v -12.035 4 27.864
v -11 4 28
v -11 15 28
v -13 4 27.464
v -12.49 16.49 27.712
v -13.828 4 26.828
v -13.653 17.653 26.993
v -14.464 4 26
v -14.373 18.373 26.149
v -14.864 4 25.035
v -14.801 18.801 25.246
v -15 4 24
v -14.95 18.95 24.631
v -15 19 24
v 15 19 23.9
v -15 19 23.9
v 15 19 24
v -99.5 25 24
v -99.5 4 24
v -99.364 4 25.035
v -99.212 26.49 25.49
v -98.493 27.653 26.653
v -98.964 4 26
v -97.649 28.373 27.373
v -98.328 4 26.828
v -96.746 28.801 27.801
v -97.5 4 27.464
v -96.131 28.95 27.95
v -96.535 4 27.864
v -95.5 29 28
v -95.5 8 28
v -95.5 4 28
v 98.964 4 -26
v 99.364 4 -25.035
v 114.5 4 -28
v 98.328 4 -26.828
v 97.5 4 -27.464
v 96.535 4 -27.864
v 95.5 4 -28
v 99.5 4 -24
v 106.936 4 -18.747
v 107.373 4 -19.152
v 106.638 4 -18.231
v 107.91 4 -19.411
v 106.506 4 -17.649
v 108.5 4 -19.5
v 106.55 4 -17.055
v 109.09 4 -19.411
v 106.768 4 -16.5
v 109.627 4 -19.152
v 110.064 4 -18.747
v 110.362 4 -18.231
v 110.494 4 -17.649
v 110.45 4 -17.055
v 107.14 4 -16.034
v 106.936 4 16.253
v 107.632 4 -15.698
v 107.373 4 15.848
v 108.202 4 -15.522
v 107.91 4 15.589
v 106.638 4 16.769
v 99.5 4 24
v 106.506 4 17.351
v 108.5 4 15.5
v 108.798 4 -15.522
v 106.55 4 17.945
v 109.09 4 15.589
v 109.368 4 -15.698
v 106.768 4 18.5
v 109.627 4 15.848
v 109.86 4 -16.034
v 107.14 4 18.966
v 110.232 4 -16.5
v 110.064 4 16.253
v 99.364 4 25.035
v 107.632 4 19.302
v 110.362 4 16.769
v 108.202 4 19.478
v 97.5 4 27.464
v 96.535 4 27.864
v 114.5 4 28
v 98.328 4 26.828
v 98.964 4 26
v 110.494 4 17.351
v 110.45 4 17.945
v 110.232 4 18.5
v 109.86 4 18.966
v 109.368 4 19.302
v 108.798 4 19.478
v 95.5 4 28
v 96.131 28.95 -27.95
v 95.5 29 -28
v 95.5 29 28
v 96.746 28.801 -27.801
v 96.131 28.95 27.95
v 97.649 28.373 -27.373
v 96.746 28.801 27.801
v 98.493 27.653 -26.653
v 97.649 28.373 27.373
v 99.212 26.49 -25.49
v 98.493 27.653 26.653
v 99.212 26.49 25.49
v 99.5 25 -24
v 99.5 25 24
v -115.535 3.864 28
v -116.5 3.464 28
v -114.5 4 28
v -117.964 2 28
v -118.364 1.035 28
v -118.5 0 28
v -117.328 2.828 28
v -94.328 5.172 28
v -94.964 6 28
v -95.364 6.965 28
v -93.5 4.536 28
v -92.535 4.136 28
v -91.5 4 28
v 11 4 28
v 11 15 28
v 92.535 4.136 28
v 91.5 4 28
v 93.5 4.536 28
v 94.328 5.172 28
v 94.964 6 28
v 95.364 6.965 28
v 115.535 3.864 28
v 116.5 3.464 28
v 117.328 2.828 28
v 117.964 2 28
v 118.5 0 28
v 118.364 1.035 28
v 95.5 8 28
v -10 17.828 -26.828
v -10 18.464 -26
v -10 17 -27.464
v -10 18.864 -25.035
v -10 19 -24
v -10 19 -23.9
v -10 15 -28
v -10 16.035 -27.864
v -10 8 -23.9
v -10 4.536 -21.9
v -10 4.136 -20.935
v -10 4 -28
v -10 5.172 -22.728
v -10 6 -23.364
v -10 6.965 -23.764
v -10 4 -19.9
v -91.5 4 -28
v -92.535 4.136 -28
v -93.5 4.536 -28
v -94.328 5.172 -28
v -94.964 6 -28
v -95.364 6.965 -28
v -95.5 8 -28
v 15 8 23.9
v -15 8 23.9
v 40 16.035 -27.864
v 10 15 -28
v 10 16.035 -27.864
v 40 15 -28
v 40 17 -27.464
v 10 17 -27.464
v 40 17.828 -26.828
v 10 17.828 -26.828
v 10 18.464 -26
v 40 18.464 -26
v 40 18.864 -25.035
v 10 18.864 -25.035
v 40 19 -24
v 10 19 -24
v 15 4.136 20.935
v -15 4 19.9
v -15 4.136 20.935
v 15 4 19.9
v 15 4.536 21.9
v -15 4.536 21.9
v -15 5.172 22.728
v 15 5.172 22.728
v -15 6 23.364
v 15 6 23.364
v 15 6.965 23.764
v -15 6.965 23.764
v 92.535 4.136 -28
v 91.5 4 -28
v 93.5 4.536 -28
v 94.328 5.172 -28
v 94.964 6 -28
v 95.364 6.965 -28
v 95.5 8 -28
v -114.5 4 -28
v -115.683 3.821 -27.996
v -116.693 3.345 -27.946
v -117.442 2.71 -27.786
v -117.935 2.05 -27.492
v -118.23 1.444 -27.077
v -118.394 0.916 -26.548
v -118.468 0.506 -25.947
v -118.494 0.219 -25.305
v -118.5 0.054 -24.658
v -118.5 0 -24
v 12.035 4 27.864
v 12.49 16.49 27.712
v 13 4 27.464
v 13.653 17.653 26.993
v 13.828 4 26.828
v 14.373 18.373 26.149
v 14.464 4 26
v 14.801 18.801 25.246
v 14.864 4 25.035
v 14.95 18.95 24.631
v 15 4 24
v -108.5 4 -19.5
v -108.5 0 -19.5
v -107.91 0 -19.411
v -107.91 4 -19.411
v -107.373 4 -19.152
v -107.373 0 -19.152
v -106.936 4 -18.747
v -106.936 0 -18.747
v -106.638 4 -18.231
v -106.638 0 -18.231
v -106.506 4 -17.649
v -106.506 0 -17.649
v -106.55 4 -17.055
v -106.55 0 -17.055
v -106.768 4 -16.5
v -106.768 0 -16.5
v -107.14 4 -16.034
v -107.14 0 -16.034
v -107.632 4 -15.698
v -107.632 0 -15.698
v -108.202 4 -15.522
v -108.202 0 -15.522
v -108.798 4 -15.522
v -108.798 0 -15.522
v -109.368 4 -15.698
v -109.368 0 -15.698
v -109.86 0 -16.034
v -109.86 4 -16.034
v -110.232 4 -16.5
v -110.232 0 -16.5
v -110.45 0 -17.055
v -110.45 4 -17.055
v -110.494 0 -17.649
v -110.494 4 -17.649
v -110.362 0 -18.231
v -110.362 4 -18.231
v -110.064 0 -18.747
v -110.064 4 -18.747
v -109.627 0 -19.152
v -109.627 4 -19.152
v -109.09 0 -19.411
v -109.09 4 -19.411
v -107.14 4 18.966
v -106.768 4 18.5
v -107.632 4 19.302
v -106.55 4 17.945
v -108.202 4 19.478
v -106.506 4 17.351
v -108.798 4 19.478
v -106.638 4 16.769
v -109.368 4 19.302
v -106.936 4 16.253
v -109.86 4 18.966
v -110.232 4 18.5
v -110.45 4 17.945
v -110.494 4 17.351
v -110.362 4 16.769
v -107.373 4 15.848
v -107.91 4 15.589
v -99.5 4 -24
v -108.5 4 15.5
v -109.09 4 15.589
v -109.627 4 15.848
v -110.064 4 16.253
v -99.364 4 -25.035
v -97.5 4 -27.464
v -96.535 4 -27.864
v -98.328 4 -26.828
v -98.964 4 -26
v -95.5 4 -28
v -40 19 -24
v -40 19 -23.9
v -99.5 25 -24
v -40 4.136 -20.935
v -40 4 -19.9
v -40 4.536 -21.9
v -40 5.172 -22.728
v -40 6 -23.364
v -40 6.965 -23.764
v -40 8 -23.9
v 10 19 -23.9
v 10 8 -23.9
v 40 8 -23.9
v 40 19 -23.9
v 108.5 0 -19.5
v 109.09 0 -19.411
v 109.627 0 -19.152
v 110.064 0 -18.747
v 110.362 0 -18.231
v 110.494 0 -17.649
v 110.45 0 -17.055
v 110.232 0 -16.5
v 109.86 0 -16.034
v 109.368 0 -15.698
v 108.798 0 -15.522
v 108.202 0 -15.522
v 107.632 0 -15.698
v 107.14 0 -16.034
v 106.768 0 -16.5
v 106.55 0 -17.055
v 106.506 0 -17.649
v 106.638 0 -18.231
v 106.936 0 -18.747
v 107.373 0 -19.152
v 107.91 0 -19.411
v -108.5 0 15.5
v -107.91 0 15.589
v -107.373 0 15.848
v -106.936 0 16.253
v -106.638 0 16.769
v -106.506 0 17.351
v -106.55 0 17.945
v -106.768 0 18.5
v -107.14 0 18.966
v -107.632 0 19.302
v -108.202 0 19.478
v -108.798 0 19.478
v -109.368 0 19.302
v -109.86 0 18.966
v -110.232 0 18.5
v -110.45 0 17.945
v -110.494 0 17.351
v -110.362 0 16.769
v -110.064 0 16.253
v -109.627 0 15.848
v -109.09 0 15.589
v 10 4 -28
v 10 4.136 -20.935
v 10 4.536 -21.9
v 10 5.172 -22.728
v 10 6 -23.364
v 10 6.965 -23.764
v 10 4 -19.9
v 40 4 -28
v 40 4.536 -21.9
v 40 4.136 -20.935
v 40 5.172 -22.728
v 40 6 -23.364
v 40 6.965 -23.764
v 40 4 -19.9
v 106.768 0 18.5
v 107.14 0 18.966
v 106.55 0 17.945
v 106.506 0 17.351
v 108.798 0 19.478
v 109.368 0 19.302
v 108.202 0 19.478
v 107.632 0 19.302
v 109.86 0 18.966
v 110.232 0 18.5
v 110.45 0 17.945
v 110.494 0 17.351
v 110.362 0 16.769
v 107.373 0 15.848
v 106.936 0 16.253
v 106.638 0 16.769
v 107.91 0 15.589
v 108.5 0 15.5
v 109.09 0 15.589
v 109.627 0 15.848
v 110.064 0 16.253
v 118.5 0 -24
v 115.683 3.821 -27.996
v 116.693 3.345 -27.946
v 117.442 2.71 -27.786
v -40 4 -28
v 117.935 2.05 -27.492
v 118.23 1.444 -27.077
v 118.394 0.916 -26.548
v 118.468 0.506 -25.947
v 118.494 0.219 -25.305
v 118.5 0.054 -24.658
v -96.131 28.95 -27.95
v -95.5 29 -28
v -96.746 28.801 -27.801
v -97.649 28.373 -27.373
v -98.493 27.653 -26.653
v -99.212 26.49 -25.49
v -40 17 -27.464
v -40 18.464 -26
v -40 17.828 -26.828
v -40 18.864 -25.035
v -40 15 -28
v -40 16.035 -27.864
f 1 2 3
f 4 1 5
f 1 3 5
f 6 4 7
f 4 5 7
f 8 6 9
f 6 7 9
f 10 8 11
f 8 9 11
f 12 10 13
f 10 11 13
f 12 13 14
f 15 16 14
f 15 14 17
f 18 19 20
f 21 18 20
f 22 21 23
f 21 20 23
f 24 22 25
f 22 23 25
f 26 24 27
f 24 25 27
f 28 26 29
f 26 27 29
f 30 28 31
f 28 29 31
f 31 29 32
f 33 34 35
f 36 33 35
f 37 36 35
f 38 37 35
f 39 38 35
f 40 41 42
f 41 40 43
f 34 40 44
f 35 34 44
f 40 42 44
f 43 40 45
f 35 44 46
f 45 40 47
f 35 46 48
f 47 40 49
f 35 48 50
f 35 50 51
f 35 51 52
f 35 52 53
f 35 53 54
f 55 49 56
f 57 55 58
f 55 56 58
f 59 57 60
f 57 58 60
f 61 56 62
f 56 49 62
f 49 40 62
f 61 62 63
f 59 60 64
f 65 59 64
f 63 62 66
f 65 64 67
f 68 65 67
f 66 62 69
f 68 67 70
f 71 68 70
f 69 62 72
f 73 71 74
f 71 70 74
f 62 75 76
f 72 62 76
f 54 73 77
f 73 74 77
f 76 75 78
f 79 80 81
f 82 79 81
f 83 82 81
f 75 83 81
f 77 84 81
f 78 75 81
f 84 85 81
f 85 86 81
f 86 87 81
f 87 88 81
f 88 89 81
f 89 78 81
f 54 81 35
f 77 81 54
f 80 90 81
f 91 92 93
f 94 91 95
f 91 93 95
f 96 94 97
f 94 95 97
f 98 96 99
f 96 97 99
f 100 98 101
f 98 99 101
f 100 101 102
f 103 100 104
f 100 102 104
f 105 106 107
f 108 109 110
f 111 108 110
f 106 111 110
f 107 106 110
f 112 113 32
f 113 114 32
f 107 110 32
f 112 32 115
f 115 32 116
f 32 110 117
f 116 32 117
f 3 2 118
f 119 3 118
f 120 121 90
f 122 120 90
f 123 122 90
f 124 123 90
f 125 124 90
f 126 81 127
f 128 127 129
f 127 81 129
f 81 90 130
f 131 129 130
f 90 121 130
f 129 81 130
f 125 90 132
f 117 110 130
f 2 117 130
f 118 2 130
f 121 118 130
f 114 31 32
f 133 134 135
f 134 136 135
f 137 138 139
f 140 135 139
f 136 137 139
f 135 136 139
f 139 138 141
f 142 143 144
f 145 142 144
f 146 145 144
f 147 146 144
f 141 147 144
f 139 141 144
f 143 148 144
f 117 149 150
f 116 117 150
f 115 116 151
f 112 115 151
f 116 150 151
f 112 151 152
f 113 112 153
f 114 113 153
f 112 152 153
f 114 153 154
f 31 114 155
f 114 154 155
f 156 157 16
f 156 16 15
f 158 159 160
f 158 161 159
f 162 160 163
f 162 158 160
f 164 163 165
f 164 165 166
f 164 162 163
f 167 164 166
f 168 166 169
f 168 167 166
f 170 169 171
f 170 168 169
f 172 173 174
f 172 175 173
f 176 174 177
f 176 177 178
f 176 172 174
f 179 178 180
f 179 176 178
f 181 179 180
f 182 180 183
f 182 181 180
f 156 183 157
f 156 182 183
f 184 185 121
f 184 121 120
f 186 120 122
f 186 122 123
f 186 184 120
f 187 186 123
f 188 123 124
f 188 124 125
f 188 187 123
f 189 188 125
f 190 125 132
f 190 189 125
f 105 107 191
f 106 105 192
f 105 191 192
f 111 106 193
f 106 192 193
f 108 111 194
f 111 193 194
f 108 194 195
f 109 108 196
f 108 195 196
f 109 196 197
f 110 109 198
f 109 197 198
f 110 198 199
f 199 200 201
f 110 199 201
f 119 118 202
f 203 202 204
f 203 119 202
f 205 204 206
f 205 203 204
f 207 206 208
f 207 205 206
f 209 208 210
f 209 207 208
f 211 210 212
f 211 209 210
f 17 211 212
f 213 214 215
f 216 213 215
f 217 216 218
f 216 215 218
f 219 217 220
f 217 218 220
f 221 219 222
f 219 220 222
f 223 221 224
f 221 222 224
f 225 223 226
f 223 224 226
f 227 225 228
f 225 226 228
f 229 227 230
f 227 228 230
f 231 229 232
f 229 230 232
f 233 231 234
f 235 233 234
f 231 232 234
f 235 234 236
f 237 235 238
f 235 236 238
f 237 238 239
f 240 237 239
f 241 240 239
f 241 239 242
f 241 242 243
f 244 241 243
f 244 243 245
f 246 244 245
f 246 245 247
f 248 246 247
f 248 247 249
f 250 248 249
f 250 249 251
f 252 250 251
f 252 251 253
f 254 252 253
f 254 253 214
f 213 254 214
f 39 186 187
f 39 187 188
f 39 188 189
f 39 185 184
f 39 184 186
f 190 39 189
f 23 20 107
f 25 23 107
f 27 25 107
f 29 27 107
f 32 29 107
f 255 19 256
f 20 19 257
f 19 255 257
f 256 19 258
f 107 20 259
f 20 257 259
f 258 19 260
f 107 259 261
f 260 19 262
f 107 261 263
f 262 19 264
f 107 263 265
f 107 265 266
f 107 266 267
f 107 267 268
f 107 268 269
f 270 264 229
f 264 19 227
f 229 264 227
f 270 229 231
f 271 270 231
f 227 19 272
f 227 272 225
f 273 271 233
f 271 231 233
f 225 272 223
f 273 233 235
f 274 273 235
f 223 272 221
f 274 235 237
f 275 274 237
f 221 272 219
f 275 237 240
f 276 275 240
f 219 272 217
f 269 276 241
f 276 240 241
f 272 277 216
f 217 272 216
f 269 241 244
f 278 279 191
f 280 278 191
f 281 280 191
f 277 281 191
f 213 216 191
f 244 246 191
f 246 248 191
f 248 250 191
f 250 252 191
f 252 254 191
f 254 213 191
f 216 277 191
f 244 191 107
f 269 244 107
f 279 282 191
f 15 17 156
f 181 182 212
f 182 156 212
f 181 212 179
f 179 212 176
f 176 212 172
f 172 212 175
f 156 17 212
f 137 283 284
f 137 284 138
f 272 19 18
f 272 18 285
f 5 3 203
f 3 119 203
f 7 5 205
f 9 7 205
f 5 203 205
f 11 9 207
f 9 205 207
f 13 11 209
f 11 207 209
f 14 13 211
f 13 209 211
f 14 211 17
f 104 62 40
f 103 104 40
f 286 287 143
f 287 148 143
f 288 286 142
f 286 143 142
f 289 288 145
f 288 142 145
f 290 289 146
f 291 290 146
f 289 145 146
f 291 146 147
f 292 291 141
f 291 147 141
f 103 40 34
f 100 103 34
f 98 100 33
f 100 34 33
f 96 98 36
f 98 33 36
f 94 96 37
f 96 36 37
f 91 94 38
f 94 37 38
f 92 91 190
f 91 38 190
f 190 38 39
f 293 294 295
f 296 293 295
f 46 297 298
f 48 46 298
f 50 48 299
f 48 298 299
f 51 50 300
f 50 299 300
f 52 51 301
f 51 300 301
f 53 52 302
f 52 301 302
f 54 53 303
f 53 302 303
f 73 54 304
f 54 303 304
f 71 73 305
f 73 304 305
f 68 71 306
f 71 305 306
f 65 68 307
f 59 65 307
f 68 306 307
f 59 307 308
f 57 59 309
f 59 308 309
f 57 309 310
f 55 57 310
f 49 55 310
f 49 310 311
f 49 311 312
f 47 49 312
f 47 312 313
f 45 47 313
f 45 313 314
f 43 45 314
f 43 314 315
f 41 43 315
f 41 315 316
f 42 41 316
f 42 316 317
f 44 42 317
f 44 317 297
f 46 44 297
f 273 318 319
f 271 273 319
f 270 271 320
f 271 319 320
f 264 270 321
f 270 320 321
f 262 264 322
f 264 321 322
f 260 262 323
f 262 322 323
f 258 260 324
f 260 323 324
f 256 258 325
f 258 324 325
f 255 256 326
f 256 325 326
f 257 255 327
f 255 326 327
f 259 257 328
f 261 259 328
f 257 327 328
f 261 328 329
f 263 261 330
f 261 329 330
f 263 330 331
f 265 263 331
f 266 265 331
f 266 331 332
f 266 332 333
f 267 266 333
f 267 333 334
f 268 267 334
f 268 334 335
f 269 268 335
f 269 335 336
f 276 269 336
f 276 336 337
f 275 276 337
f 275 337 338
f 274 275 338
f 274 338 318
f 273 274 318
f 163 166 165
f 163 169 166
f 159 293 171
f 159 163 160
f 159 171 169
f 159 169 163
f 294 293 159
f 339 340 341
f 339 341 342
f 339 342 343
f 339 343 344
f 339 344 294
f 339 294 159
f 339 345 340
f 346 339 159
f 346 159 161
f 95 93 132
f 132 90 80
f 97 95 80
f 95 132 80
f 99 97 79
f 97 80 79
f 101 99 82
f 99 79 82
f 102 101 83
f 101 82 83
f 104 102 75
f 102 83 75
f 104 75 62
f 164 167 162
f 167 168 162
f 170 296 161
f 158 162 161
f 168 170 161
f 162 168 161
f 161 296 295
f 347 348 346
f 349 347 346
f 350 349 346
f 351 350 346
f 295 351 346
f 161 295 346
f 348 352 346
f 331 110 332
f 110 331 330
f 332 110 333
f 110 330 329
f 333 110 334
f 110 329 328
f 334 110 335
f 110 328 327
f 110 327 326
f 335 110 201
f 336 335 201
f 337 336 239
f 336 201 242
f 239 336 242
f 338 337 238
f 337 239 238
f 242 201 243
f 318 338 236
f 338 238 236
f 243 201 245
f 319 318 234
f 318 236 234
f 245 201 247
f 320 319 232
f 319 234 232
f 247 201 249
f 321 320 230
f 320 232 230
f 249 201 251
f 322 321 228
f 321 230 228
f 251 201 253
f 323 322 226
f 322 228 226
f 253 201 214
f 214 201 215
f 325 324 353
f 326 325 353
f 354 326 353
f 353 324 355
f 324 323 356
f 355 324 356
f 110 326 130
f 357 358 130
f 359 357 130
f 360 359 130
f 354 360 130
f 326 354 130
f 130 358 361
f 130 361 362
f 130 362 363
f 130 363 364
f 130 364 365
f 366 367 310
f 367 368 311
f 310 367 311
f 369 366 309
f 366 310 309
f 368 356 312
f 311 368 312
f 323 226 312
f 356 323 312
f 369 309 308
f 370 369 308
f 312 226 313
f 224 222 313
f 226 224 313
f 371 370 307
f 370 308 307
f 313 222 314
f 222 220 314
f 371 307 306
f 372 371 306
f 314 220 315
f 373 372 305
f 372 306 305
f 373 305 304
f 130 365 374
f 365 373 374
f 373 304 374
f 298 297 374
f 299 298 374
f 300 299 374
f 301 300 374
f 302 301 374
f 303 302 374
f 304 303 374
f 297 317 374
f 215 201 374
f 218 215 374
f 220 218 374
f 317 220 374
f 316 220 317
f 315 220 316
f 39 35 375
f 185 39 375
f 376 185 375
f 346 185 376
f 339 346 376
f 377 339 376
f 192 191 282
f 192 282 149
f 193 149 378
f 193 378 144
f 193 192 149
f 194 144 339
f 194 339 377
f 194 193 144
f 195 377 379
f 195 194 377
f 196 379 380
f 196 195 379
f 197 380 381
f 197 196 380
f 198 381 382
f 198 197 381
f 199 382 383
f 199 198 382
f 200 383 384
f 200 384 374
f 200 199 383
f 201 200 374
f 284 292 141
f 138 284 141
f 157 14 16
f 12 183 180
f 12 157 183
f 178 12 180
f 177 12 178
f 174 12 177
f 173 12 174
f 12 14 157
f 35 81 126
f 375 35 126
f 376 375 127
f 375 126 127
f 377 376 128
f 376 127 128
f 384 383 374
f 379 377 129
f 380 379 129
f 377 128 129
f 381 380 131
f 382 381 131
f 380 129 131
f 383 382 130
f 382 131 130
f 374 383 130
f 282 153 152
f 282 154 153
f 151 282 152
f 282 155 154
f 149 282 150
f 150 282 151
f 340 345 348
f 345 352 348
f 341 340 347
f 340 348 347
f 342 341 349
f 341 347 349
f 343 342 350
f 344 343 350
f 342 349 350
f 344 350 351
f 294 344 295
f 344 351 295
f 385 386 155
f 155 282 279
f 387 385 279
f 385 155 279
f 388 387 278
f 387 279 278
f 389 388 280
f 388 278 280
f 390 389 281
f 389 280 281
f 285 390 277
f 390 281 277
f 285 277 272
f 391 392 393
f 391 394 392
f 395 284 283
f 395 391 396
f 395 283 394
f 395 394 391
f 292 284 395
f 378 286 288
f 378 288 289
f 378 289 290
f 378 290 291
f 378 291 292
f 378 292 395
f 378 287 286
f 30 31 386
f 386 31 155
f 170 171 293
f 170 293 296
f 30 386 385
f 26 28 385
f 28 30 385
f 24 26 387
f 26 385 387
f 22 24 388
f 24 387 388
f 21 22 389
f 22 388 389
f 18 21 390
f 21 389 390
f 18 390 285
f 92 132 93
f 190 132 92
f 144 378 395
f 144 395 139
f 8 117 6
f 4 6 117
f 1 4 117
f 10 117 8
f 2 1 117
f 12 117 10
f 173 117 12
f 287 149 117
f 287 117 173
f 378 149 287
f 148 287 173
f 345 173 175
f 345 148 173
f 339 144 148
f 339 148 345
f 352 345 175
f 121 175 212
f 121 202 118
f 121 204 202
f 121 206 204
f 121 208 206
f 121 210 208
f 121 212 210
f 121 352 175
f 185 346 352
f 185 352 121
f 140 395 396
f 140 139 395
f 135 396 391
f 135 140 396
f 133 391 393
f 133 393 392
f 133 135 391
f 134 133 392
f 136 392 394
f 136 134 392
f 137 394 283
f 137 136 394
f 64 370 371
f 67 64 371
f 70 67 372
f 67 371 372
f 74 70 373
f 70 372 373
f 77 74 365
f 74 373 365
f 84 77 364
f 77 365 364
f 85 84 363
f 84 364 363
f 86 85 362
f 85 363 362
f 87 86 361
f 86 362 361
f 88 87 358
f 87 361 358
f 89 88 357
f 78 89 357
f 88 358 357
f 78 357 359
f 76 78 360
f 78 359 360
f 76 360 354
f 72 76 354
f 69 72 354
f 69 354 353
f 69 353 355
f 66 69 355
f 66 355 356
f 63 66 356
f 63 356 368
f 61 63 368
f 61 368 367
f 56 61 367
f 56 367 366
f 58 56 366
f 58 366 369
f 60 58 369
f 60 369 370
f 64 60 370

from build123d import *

# Parameters (mm, degrees)
SKETCH1_W           = 237
SKETCH1_H           = 56
BOSS_EXTRUDE1_DEPTH = 4
SKETCH2_R           = 2
CUT_EXTRUDE1_DEPTH  = 5
SKETCH5_W           = 30
SKETCH5_H           = 4.1
BOSS_EXTRUDE2_DEPTH = 15
SKETCH6_W           = 4
SKETCH6_H           = 56
BOSS_EXTRUDE3_DEPTH = 25
FILLET1_START       = -119
FILLET1_DEPTH       = 238
FILLET3_R           = 4
FILLET4_R           = 4
FILLET5_R           = 4
FILLET6_R           = 4


with BuildPart() as part:
    # Sketch1 → Boss-Extrude1 (new body)
    with BuildSketch(Plane(origin=(0, 0, 0), x_dir=(1, 0, 0), z_dir=(0, 1, 0))):
        Rectangle(SKETCH1_W, SKETCH1_H)
    extrude(amount=BOSS_EXTRUDE1_DEPTH)

    # Sketch2 → Cut-Extrude1 (cut)
    with BuildSketch(Plane.XZ):
        with Locations(Location((108.5, 17.5, 0), (0, 0, 270))):
            Circle(SKETCH2_R)
        with Locations(Location((108.5, -17.5, 0), (0, 0, 270))):
            Circle(SKETCH2_R)
        with Locations(Location((-108.5, -17.5, 0), (0, 0, 270))):
            Circle(SKETCH2_R)
        with Locations(Location((-108.5, 17.5, 0), (0, 0, 270))):
            Circle(SKETCH2_R)
    extrude(amount=-CUT_EXTRUDE1_DEPTH, mode=Mode.SUBTRACT)

    # Sketch5 → Boss-Extrude2 (add)
    with BuildSketch(Plane(origin=(0, 4, 0), x_dir=(1, 0, 0), z_dir=(0, 1, 0))):
        with Locations((0, -25.95)):
            Rectangle(SKETCH5_W, SKETCH5_H)
        with Locations((25, 25.95)):
            Rectangle(SKETCH5_W, SKETCH5_H)
        with Locations((-25, 25.95)):
            Rectangle(SKETCH5_W, SKETCH5_H)
    extrude(amount=BOSS_EXTRUDE2_DEPTH)

    # Sketch6 → Boss-Extrude3 (add)
    with BuildSketch(Plane(origin=(0, 4, 0), x_dir=(1, 0, 0), z_dir=(0, 1, 0))):
        with Locations((-97.5, 0)):
            Rectangle(SKETCH6_W, SKETCH6_H)
        with Locations((97.5, 0)):
            Rectangle(SKETCH6_W, SKETCH6_H)
    extrude(amount=BOSS_EXTRUDE3_DEPTH)

    # Fillet1: read off the stored shape, not the designer's step
    # Fillet1 outline → Fillet1 (cut)
    with BuildSketch(Plane.YZ.offset(FILLET1_START)):
        with BuildLine():
            ThreePointArc((4, -28), (1.171572875, -26.828427125), (0, -24))
            Line((0, -24), (0, -28))
            Line((0, -28), (4, -28))
        make_face()
    extrude(amount=FILLET1_DEPTH, mode=Mode.SUBTRACT)

    # Fillet3
    fillet3_edges = [part.edges().sort_by_distance(p)[0] for p in [
        (0, 4, 23.9),
        (25, 4, -23.9),
        (-25, 4, -23.9),
        (-95.5, 4, 0),
        (95.5, 4, 0),
    ]]
    fillet(fillet3_edges, radius=FILLET3_R)

    # Fillet4
    # the kernel refuses this fillet: 4 mm, written as the material it takes off along each edge
    with BuildSketch(Plane(origin=(-118.5, 4, -38), x_dir=(0, -1, 0), z_dir=(0, 0, 1)), Plane(origin=(-99.5, 29, -38), x_dir=(0, -1, 0), z_dir=(0, 0, 1))) as fillet4_piece_1:
        with BuildLine():
            CenterArc((FILLET4_R, FILLET4_R), FILLET4_R, 180, 90)
            Line((0, FILLET4_R), (0, 0))
            Line((0, 0), (FILLET4_R, 0))
        make_face()
    extrude(amount=76, mode=Mode.SUBTRACT)
    with BuildSketch(Plane(origin=(118.5, 4, 38), x_dir=(-1, 0, 0), z_dir=(0, 0, -1)), Plane(origin=(99.5, 29, 38), x_dir=(-1, 0, 0), z_dir=(0, 0, -1))) as fillet4_piece_2:
        with BuildLine():
            CenterArc((FILLET4_R, -FILLET4_R), FILLET4_R, 90, 90)
            Line((0, -FILLET4_R), (0, 0))
            Line((0, 0), (FILLET4_R, 0))
        make_face()
    extrude(amount=76, mode=Mode.SUBTRACT)
    with BuildSketch(Plane(origin=(-99.5, 4, -28), x_dir=(1, 0, 0), z_dir=(0, 1, 0)), Plane(origin=(99.5, 4, 28), x_dir=(-1, 0, 0), z_dir=(0, 1, 0))) as fillet4_piece_3:
        with BuildLine():
            CenterArc((FILLET4_R, -FILLET4_R), FILLET4_R, 90, 90)
            Line((0, -FILLET4_R), (0, 0))
            Line((0, 0), (FILLET4_R, 0))
        make_face()
    extrude(amount=35, mode=Mode.SUBTRACT)
    with BuildSketch(Plane(origin=(-99.5, 4, 28), x_dir=(1, 0, 0), z_dir=(0, 1, 0)), Plane(origin=(99.5, 4, -28), x_dir=(-1, 0, 0), z_dir=(0, 1, 0))) as fillet4_piece_4:
        with BuildLine():
            CenterArc((FILLET4_R, FILLET4_R), FILLET4_R, 180, 90)
            Line((0, FILLET4_R), (0, 0))
            Line((0, 0), (FILLET4_R, 0))
        make_face()
    extrude(amount=35, mode=Mode.SUBTRACT)

    # Fillet5
    fillet5_edges = [part.edges().sort_by_distance(p)[0] for p in [
        (15, 11.5, 28),
        (-15, 11.5, 28),
        (0, 19, 28),
    ]]
    fillet(fillet5_edges, radius=FILLET5_R)

    # Fillet6
    fillet6_edges = [part.edges().sort_by_distance(p)[0] for p in [
        (25, 19, -28),
        (-25, 19, -28),
    ]]
    fillet(fillet6_edges, radius=FILLET6_R)


solid = part.part
